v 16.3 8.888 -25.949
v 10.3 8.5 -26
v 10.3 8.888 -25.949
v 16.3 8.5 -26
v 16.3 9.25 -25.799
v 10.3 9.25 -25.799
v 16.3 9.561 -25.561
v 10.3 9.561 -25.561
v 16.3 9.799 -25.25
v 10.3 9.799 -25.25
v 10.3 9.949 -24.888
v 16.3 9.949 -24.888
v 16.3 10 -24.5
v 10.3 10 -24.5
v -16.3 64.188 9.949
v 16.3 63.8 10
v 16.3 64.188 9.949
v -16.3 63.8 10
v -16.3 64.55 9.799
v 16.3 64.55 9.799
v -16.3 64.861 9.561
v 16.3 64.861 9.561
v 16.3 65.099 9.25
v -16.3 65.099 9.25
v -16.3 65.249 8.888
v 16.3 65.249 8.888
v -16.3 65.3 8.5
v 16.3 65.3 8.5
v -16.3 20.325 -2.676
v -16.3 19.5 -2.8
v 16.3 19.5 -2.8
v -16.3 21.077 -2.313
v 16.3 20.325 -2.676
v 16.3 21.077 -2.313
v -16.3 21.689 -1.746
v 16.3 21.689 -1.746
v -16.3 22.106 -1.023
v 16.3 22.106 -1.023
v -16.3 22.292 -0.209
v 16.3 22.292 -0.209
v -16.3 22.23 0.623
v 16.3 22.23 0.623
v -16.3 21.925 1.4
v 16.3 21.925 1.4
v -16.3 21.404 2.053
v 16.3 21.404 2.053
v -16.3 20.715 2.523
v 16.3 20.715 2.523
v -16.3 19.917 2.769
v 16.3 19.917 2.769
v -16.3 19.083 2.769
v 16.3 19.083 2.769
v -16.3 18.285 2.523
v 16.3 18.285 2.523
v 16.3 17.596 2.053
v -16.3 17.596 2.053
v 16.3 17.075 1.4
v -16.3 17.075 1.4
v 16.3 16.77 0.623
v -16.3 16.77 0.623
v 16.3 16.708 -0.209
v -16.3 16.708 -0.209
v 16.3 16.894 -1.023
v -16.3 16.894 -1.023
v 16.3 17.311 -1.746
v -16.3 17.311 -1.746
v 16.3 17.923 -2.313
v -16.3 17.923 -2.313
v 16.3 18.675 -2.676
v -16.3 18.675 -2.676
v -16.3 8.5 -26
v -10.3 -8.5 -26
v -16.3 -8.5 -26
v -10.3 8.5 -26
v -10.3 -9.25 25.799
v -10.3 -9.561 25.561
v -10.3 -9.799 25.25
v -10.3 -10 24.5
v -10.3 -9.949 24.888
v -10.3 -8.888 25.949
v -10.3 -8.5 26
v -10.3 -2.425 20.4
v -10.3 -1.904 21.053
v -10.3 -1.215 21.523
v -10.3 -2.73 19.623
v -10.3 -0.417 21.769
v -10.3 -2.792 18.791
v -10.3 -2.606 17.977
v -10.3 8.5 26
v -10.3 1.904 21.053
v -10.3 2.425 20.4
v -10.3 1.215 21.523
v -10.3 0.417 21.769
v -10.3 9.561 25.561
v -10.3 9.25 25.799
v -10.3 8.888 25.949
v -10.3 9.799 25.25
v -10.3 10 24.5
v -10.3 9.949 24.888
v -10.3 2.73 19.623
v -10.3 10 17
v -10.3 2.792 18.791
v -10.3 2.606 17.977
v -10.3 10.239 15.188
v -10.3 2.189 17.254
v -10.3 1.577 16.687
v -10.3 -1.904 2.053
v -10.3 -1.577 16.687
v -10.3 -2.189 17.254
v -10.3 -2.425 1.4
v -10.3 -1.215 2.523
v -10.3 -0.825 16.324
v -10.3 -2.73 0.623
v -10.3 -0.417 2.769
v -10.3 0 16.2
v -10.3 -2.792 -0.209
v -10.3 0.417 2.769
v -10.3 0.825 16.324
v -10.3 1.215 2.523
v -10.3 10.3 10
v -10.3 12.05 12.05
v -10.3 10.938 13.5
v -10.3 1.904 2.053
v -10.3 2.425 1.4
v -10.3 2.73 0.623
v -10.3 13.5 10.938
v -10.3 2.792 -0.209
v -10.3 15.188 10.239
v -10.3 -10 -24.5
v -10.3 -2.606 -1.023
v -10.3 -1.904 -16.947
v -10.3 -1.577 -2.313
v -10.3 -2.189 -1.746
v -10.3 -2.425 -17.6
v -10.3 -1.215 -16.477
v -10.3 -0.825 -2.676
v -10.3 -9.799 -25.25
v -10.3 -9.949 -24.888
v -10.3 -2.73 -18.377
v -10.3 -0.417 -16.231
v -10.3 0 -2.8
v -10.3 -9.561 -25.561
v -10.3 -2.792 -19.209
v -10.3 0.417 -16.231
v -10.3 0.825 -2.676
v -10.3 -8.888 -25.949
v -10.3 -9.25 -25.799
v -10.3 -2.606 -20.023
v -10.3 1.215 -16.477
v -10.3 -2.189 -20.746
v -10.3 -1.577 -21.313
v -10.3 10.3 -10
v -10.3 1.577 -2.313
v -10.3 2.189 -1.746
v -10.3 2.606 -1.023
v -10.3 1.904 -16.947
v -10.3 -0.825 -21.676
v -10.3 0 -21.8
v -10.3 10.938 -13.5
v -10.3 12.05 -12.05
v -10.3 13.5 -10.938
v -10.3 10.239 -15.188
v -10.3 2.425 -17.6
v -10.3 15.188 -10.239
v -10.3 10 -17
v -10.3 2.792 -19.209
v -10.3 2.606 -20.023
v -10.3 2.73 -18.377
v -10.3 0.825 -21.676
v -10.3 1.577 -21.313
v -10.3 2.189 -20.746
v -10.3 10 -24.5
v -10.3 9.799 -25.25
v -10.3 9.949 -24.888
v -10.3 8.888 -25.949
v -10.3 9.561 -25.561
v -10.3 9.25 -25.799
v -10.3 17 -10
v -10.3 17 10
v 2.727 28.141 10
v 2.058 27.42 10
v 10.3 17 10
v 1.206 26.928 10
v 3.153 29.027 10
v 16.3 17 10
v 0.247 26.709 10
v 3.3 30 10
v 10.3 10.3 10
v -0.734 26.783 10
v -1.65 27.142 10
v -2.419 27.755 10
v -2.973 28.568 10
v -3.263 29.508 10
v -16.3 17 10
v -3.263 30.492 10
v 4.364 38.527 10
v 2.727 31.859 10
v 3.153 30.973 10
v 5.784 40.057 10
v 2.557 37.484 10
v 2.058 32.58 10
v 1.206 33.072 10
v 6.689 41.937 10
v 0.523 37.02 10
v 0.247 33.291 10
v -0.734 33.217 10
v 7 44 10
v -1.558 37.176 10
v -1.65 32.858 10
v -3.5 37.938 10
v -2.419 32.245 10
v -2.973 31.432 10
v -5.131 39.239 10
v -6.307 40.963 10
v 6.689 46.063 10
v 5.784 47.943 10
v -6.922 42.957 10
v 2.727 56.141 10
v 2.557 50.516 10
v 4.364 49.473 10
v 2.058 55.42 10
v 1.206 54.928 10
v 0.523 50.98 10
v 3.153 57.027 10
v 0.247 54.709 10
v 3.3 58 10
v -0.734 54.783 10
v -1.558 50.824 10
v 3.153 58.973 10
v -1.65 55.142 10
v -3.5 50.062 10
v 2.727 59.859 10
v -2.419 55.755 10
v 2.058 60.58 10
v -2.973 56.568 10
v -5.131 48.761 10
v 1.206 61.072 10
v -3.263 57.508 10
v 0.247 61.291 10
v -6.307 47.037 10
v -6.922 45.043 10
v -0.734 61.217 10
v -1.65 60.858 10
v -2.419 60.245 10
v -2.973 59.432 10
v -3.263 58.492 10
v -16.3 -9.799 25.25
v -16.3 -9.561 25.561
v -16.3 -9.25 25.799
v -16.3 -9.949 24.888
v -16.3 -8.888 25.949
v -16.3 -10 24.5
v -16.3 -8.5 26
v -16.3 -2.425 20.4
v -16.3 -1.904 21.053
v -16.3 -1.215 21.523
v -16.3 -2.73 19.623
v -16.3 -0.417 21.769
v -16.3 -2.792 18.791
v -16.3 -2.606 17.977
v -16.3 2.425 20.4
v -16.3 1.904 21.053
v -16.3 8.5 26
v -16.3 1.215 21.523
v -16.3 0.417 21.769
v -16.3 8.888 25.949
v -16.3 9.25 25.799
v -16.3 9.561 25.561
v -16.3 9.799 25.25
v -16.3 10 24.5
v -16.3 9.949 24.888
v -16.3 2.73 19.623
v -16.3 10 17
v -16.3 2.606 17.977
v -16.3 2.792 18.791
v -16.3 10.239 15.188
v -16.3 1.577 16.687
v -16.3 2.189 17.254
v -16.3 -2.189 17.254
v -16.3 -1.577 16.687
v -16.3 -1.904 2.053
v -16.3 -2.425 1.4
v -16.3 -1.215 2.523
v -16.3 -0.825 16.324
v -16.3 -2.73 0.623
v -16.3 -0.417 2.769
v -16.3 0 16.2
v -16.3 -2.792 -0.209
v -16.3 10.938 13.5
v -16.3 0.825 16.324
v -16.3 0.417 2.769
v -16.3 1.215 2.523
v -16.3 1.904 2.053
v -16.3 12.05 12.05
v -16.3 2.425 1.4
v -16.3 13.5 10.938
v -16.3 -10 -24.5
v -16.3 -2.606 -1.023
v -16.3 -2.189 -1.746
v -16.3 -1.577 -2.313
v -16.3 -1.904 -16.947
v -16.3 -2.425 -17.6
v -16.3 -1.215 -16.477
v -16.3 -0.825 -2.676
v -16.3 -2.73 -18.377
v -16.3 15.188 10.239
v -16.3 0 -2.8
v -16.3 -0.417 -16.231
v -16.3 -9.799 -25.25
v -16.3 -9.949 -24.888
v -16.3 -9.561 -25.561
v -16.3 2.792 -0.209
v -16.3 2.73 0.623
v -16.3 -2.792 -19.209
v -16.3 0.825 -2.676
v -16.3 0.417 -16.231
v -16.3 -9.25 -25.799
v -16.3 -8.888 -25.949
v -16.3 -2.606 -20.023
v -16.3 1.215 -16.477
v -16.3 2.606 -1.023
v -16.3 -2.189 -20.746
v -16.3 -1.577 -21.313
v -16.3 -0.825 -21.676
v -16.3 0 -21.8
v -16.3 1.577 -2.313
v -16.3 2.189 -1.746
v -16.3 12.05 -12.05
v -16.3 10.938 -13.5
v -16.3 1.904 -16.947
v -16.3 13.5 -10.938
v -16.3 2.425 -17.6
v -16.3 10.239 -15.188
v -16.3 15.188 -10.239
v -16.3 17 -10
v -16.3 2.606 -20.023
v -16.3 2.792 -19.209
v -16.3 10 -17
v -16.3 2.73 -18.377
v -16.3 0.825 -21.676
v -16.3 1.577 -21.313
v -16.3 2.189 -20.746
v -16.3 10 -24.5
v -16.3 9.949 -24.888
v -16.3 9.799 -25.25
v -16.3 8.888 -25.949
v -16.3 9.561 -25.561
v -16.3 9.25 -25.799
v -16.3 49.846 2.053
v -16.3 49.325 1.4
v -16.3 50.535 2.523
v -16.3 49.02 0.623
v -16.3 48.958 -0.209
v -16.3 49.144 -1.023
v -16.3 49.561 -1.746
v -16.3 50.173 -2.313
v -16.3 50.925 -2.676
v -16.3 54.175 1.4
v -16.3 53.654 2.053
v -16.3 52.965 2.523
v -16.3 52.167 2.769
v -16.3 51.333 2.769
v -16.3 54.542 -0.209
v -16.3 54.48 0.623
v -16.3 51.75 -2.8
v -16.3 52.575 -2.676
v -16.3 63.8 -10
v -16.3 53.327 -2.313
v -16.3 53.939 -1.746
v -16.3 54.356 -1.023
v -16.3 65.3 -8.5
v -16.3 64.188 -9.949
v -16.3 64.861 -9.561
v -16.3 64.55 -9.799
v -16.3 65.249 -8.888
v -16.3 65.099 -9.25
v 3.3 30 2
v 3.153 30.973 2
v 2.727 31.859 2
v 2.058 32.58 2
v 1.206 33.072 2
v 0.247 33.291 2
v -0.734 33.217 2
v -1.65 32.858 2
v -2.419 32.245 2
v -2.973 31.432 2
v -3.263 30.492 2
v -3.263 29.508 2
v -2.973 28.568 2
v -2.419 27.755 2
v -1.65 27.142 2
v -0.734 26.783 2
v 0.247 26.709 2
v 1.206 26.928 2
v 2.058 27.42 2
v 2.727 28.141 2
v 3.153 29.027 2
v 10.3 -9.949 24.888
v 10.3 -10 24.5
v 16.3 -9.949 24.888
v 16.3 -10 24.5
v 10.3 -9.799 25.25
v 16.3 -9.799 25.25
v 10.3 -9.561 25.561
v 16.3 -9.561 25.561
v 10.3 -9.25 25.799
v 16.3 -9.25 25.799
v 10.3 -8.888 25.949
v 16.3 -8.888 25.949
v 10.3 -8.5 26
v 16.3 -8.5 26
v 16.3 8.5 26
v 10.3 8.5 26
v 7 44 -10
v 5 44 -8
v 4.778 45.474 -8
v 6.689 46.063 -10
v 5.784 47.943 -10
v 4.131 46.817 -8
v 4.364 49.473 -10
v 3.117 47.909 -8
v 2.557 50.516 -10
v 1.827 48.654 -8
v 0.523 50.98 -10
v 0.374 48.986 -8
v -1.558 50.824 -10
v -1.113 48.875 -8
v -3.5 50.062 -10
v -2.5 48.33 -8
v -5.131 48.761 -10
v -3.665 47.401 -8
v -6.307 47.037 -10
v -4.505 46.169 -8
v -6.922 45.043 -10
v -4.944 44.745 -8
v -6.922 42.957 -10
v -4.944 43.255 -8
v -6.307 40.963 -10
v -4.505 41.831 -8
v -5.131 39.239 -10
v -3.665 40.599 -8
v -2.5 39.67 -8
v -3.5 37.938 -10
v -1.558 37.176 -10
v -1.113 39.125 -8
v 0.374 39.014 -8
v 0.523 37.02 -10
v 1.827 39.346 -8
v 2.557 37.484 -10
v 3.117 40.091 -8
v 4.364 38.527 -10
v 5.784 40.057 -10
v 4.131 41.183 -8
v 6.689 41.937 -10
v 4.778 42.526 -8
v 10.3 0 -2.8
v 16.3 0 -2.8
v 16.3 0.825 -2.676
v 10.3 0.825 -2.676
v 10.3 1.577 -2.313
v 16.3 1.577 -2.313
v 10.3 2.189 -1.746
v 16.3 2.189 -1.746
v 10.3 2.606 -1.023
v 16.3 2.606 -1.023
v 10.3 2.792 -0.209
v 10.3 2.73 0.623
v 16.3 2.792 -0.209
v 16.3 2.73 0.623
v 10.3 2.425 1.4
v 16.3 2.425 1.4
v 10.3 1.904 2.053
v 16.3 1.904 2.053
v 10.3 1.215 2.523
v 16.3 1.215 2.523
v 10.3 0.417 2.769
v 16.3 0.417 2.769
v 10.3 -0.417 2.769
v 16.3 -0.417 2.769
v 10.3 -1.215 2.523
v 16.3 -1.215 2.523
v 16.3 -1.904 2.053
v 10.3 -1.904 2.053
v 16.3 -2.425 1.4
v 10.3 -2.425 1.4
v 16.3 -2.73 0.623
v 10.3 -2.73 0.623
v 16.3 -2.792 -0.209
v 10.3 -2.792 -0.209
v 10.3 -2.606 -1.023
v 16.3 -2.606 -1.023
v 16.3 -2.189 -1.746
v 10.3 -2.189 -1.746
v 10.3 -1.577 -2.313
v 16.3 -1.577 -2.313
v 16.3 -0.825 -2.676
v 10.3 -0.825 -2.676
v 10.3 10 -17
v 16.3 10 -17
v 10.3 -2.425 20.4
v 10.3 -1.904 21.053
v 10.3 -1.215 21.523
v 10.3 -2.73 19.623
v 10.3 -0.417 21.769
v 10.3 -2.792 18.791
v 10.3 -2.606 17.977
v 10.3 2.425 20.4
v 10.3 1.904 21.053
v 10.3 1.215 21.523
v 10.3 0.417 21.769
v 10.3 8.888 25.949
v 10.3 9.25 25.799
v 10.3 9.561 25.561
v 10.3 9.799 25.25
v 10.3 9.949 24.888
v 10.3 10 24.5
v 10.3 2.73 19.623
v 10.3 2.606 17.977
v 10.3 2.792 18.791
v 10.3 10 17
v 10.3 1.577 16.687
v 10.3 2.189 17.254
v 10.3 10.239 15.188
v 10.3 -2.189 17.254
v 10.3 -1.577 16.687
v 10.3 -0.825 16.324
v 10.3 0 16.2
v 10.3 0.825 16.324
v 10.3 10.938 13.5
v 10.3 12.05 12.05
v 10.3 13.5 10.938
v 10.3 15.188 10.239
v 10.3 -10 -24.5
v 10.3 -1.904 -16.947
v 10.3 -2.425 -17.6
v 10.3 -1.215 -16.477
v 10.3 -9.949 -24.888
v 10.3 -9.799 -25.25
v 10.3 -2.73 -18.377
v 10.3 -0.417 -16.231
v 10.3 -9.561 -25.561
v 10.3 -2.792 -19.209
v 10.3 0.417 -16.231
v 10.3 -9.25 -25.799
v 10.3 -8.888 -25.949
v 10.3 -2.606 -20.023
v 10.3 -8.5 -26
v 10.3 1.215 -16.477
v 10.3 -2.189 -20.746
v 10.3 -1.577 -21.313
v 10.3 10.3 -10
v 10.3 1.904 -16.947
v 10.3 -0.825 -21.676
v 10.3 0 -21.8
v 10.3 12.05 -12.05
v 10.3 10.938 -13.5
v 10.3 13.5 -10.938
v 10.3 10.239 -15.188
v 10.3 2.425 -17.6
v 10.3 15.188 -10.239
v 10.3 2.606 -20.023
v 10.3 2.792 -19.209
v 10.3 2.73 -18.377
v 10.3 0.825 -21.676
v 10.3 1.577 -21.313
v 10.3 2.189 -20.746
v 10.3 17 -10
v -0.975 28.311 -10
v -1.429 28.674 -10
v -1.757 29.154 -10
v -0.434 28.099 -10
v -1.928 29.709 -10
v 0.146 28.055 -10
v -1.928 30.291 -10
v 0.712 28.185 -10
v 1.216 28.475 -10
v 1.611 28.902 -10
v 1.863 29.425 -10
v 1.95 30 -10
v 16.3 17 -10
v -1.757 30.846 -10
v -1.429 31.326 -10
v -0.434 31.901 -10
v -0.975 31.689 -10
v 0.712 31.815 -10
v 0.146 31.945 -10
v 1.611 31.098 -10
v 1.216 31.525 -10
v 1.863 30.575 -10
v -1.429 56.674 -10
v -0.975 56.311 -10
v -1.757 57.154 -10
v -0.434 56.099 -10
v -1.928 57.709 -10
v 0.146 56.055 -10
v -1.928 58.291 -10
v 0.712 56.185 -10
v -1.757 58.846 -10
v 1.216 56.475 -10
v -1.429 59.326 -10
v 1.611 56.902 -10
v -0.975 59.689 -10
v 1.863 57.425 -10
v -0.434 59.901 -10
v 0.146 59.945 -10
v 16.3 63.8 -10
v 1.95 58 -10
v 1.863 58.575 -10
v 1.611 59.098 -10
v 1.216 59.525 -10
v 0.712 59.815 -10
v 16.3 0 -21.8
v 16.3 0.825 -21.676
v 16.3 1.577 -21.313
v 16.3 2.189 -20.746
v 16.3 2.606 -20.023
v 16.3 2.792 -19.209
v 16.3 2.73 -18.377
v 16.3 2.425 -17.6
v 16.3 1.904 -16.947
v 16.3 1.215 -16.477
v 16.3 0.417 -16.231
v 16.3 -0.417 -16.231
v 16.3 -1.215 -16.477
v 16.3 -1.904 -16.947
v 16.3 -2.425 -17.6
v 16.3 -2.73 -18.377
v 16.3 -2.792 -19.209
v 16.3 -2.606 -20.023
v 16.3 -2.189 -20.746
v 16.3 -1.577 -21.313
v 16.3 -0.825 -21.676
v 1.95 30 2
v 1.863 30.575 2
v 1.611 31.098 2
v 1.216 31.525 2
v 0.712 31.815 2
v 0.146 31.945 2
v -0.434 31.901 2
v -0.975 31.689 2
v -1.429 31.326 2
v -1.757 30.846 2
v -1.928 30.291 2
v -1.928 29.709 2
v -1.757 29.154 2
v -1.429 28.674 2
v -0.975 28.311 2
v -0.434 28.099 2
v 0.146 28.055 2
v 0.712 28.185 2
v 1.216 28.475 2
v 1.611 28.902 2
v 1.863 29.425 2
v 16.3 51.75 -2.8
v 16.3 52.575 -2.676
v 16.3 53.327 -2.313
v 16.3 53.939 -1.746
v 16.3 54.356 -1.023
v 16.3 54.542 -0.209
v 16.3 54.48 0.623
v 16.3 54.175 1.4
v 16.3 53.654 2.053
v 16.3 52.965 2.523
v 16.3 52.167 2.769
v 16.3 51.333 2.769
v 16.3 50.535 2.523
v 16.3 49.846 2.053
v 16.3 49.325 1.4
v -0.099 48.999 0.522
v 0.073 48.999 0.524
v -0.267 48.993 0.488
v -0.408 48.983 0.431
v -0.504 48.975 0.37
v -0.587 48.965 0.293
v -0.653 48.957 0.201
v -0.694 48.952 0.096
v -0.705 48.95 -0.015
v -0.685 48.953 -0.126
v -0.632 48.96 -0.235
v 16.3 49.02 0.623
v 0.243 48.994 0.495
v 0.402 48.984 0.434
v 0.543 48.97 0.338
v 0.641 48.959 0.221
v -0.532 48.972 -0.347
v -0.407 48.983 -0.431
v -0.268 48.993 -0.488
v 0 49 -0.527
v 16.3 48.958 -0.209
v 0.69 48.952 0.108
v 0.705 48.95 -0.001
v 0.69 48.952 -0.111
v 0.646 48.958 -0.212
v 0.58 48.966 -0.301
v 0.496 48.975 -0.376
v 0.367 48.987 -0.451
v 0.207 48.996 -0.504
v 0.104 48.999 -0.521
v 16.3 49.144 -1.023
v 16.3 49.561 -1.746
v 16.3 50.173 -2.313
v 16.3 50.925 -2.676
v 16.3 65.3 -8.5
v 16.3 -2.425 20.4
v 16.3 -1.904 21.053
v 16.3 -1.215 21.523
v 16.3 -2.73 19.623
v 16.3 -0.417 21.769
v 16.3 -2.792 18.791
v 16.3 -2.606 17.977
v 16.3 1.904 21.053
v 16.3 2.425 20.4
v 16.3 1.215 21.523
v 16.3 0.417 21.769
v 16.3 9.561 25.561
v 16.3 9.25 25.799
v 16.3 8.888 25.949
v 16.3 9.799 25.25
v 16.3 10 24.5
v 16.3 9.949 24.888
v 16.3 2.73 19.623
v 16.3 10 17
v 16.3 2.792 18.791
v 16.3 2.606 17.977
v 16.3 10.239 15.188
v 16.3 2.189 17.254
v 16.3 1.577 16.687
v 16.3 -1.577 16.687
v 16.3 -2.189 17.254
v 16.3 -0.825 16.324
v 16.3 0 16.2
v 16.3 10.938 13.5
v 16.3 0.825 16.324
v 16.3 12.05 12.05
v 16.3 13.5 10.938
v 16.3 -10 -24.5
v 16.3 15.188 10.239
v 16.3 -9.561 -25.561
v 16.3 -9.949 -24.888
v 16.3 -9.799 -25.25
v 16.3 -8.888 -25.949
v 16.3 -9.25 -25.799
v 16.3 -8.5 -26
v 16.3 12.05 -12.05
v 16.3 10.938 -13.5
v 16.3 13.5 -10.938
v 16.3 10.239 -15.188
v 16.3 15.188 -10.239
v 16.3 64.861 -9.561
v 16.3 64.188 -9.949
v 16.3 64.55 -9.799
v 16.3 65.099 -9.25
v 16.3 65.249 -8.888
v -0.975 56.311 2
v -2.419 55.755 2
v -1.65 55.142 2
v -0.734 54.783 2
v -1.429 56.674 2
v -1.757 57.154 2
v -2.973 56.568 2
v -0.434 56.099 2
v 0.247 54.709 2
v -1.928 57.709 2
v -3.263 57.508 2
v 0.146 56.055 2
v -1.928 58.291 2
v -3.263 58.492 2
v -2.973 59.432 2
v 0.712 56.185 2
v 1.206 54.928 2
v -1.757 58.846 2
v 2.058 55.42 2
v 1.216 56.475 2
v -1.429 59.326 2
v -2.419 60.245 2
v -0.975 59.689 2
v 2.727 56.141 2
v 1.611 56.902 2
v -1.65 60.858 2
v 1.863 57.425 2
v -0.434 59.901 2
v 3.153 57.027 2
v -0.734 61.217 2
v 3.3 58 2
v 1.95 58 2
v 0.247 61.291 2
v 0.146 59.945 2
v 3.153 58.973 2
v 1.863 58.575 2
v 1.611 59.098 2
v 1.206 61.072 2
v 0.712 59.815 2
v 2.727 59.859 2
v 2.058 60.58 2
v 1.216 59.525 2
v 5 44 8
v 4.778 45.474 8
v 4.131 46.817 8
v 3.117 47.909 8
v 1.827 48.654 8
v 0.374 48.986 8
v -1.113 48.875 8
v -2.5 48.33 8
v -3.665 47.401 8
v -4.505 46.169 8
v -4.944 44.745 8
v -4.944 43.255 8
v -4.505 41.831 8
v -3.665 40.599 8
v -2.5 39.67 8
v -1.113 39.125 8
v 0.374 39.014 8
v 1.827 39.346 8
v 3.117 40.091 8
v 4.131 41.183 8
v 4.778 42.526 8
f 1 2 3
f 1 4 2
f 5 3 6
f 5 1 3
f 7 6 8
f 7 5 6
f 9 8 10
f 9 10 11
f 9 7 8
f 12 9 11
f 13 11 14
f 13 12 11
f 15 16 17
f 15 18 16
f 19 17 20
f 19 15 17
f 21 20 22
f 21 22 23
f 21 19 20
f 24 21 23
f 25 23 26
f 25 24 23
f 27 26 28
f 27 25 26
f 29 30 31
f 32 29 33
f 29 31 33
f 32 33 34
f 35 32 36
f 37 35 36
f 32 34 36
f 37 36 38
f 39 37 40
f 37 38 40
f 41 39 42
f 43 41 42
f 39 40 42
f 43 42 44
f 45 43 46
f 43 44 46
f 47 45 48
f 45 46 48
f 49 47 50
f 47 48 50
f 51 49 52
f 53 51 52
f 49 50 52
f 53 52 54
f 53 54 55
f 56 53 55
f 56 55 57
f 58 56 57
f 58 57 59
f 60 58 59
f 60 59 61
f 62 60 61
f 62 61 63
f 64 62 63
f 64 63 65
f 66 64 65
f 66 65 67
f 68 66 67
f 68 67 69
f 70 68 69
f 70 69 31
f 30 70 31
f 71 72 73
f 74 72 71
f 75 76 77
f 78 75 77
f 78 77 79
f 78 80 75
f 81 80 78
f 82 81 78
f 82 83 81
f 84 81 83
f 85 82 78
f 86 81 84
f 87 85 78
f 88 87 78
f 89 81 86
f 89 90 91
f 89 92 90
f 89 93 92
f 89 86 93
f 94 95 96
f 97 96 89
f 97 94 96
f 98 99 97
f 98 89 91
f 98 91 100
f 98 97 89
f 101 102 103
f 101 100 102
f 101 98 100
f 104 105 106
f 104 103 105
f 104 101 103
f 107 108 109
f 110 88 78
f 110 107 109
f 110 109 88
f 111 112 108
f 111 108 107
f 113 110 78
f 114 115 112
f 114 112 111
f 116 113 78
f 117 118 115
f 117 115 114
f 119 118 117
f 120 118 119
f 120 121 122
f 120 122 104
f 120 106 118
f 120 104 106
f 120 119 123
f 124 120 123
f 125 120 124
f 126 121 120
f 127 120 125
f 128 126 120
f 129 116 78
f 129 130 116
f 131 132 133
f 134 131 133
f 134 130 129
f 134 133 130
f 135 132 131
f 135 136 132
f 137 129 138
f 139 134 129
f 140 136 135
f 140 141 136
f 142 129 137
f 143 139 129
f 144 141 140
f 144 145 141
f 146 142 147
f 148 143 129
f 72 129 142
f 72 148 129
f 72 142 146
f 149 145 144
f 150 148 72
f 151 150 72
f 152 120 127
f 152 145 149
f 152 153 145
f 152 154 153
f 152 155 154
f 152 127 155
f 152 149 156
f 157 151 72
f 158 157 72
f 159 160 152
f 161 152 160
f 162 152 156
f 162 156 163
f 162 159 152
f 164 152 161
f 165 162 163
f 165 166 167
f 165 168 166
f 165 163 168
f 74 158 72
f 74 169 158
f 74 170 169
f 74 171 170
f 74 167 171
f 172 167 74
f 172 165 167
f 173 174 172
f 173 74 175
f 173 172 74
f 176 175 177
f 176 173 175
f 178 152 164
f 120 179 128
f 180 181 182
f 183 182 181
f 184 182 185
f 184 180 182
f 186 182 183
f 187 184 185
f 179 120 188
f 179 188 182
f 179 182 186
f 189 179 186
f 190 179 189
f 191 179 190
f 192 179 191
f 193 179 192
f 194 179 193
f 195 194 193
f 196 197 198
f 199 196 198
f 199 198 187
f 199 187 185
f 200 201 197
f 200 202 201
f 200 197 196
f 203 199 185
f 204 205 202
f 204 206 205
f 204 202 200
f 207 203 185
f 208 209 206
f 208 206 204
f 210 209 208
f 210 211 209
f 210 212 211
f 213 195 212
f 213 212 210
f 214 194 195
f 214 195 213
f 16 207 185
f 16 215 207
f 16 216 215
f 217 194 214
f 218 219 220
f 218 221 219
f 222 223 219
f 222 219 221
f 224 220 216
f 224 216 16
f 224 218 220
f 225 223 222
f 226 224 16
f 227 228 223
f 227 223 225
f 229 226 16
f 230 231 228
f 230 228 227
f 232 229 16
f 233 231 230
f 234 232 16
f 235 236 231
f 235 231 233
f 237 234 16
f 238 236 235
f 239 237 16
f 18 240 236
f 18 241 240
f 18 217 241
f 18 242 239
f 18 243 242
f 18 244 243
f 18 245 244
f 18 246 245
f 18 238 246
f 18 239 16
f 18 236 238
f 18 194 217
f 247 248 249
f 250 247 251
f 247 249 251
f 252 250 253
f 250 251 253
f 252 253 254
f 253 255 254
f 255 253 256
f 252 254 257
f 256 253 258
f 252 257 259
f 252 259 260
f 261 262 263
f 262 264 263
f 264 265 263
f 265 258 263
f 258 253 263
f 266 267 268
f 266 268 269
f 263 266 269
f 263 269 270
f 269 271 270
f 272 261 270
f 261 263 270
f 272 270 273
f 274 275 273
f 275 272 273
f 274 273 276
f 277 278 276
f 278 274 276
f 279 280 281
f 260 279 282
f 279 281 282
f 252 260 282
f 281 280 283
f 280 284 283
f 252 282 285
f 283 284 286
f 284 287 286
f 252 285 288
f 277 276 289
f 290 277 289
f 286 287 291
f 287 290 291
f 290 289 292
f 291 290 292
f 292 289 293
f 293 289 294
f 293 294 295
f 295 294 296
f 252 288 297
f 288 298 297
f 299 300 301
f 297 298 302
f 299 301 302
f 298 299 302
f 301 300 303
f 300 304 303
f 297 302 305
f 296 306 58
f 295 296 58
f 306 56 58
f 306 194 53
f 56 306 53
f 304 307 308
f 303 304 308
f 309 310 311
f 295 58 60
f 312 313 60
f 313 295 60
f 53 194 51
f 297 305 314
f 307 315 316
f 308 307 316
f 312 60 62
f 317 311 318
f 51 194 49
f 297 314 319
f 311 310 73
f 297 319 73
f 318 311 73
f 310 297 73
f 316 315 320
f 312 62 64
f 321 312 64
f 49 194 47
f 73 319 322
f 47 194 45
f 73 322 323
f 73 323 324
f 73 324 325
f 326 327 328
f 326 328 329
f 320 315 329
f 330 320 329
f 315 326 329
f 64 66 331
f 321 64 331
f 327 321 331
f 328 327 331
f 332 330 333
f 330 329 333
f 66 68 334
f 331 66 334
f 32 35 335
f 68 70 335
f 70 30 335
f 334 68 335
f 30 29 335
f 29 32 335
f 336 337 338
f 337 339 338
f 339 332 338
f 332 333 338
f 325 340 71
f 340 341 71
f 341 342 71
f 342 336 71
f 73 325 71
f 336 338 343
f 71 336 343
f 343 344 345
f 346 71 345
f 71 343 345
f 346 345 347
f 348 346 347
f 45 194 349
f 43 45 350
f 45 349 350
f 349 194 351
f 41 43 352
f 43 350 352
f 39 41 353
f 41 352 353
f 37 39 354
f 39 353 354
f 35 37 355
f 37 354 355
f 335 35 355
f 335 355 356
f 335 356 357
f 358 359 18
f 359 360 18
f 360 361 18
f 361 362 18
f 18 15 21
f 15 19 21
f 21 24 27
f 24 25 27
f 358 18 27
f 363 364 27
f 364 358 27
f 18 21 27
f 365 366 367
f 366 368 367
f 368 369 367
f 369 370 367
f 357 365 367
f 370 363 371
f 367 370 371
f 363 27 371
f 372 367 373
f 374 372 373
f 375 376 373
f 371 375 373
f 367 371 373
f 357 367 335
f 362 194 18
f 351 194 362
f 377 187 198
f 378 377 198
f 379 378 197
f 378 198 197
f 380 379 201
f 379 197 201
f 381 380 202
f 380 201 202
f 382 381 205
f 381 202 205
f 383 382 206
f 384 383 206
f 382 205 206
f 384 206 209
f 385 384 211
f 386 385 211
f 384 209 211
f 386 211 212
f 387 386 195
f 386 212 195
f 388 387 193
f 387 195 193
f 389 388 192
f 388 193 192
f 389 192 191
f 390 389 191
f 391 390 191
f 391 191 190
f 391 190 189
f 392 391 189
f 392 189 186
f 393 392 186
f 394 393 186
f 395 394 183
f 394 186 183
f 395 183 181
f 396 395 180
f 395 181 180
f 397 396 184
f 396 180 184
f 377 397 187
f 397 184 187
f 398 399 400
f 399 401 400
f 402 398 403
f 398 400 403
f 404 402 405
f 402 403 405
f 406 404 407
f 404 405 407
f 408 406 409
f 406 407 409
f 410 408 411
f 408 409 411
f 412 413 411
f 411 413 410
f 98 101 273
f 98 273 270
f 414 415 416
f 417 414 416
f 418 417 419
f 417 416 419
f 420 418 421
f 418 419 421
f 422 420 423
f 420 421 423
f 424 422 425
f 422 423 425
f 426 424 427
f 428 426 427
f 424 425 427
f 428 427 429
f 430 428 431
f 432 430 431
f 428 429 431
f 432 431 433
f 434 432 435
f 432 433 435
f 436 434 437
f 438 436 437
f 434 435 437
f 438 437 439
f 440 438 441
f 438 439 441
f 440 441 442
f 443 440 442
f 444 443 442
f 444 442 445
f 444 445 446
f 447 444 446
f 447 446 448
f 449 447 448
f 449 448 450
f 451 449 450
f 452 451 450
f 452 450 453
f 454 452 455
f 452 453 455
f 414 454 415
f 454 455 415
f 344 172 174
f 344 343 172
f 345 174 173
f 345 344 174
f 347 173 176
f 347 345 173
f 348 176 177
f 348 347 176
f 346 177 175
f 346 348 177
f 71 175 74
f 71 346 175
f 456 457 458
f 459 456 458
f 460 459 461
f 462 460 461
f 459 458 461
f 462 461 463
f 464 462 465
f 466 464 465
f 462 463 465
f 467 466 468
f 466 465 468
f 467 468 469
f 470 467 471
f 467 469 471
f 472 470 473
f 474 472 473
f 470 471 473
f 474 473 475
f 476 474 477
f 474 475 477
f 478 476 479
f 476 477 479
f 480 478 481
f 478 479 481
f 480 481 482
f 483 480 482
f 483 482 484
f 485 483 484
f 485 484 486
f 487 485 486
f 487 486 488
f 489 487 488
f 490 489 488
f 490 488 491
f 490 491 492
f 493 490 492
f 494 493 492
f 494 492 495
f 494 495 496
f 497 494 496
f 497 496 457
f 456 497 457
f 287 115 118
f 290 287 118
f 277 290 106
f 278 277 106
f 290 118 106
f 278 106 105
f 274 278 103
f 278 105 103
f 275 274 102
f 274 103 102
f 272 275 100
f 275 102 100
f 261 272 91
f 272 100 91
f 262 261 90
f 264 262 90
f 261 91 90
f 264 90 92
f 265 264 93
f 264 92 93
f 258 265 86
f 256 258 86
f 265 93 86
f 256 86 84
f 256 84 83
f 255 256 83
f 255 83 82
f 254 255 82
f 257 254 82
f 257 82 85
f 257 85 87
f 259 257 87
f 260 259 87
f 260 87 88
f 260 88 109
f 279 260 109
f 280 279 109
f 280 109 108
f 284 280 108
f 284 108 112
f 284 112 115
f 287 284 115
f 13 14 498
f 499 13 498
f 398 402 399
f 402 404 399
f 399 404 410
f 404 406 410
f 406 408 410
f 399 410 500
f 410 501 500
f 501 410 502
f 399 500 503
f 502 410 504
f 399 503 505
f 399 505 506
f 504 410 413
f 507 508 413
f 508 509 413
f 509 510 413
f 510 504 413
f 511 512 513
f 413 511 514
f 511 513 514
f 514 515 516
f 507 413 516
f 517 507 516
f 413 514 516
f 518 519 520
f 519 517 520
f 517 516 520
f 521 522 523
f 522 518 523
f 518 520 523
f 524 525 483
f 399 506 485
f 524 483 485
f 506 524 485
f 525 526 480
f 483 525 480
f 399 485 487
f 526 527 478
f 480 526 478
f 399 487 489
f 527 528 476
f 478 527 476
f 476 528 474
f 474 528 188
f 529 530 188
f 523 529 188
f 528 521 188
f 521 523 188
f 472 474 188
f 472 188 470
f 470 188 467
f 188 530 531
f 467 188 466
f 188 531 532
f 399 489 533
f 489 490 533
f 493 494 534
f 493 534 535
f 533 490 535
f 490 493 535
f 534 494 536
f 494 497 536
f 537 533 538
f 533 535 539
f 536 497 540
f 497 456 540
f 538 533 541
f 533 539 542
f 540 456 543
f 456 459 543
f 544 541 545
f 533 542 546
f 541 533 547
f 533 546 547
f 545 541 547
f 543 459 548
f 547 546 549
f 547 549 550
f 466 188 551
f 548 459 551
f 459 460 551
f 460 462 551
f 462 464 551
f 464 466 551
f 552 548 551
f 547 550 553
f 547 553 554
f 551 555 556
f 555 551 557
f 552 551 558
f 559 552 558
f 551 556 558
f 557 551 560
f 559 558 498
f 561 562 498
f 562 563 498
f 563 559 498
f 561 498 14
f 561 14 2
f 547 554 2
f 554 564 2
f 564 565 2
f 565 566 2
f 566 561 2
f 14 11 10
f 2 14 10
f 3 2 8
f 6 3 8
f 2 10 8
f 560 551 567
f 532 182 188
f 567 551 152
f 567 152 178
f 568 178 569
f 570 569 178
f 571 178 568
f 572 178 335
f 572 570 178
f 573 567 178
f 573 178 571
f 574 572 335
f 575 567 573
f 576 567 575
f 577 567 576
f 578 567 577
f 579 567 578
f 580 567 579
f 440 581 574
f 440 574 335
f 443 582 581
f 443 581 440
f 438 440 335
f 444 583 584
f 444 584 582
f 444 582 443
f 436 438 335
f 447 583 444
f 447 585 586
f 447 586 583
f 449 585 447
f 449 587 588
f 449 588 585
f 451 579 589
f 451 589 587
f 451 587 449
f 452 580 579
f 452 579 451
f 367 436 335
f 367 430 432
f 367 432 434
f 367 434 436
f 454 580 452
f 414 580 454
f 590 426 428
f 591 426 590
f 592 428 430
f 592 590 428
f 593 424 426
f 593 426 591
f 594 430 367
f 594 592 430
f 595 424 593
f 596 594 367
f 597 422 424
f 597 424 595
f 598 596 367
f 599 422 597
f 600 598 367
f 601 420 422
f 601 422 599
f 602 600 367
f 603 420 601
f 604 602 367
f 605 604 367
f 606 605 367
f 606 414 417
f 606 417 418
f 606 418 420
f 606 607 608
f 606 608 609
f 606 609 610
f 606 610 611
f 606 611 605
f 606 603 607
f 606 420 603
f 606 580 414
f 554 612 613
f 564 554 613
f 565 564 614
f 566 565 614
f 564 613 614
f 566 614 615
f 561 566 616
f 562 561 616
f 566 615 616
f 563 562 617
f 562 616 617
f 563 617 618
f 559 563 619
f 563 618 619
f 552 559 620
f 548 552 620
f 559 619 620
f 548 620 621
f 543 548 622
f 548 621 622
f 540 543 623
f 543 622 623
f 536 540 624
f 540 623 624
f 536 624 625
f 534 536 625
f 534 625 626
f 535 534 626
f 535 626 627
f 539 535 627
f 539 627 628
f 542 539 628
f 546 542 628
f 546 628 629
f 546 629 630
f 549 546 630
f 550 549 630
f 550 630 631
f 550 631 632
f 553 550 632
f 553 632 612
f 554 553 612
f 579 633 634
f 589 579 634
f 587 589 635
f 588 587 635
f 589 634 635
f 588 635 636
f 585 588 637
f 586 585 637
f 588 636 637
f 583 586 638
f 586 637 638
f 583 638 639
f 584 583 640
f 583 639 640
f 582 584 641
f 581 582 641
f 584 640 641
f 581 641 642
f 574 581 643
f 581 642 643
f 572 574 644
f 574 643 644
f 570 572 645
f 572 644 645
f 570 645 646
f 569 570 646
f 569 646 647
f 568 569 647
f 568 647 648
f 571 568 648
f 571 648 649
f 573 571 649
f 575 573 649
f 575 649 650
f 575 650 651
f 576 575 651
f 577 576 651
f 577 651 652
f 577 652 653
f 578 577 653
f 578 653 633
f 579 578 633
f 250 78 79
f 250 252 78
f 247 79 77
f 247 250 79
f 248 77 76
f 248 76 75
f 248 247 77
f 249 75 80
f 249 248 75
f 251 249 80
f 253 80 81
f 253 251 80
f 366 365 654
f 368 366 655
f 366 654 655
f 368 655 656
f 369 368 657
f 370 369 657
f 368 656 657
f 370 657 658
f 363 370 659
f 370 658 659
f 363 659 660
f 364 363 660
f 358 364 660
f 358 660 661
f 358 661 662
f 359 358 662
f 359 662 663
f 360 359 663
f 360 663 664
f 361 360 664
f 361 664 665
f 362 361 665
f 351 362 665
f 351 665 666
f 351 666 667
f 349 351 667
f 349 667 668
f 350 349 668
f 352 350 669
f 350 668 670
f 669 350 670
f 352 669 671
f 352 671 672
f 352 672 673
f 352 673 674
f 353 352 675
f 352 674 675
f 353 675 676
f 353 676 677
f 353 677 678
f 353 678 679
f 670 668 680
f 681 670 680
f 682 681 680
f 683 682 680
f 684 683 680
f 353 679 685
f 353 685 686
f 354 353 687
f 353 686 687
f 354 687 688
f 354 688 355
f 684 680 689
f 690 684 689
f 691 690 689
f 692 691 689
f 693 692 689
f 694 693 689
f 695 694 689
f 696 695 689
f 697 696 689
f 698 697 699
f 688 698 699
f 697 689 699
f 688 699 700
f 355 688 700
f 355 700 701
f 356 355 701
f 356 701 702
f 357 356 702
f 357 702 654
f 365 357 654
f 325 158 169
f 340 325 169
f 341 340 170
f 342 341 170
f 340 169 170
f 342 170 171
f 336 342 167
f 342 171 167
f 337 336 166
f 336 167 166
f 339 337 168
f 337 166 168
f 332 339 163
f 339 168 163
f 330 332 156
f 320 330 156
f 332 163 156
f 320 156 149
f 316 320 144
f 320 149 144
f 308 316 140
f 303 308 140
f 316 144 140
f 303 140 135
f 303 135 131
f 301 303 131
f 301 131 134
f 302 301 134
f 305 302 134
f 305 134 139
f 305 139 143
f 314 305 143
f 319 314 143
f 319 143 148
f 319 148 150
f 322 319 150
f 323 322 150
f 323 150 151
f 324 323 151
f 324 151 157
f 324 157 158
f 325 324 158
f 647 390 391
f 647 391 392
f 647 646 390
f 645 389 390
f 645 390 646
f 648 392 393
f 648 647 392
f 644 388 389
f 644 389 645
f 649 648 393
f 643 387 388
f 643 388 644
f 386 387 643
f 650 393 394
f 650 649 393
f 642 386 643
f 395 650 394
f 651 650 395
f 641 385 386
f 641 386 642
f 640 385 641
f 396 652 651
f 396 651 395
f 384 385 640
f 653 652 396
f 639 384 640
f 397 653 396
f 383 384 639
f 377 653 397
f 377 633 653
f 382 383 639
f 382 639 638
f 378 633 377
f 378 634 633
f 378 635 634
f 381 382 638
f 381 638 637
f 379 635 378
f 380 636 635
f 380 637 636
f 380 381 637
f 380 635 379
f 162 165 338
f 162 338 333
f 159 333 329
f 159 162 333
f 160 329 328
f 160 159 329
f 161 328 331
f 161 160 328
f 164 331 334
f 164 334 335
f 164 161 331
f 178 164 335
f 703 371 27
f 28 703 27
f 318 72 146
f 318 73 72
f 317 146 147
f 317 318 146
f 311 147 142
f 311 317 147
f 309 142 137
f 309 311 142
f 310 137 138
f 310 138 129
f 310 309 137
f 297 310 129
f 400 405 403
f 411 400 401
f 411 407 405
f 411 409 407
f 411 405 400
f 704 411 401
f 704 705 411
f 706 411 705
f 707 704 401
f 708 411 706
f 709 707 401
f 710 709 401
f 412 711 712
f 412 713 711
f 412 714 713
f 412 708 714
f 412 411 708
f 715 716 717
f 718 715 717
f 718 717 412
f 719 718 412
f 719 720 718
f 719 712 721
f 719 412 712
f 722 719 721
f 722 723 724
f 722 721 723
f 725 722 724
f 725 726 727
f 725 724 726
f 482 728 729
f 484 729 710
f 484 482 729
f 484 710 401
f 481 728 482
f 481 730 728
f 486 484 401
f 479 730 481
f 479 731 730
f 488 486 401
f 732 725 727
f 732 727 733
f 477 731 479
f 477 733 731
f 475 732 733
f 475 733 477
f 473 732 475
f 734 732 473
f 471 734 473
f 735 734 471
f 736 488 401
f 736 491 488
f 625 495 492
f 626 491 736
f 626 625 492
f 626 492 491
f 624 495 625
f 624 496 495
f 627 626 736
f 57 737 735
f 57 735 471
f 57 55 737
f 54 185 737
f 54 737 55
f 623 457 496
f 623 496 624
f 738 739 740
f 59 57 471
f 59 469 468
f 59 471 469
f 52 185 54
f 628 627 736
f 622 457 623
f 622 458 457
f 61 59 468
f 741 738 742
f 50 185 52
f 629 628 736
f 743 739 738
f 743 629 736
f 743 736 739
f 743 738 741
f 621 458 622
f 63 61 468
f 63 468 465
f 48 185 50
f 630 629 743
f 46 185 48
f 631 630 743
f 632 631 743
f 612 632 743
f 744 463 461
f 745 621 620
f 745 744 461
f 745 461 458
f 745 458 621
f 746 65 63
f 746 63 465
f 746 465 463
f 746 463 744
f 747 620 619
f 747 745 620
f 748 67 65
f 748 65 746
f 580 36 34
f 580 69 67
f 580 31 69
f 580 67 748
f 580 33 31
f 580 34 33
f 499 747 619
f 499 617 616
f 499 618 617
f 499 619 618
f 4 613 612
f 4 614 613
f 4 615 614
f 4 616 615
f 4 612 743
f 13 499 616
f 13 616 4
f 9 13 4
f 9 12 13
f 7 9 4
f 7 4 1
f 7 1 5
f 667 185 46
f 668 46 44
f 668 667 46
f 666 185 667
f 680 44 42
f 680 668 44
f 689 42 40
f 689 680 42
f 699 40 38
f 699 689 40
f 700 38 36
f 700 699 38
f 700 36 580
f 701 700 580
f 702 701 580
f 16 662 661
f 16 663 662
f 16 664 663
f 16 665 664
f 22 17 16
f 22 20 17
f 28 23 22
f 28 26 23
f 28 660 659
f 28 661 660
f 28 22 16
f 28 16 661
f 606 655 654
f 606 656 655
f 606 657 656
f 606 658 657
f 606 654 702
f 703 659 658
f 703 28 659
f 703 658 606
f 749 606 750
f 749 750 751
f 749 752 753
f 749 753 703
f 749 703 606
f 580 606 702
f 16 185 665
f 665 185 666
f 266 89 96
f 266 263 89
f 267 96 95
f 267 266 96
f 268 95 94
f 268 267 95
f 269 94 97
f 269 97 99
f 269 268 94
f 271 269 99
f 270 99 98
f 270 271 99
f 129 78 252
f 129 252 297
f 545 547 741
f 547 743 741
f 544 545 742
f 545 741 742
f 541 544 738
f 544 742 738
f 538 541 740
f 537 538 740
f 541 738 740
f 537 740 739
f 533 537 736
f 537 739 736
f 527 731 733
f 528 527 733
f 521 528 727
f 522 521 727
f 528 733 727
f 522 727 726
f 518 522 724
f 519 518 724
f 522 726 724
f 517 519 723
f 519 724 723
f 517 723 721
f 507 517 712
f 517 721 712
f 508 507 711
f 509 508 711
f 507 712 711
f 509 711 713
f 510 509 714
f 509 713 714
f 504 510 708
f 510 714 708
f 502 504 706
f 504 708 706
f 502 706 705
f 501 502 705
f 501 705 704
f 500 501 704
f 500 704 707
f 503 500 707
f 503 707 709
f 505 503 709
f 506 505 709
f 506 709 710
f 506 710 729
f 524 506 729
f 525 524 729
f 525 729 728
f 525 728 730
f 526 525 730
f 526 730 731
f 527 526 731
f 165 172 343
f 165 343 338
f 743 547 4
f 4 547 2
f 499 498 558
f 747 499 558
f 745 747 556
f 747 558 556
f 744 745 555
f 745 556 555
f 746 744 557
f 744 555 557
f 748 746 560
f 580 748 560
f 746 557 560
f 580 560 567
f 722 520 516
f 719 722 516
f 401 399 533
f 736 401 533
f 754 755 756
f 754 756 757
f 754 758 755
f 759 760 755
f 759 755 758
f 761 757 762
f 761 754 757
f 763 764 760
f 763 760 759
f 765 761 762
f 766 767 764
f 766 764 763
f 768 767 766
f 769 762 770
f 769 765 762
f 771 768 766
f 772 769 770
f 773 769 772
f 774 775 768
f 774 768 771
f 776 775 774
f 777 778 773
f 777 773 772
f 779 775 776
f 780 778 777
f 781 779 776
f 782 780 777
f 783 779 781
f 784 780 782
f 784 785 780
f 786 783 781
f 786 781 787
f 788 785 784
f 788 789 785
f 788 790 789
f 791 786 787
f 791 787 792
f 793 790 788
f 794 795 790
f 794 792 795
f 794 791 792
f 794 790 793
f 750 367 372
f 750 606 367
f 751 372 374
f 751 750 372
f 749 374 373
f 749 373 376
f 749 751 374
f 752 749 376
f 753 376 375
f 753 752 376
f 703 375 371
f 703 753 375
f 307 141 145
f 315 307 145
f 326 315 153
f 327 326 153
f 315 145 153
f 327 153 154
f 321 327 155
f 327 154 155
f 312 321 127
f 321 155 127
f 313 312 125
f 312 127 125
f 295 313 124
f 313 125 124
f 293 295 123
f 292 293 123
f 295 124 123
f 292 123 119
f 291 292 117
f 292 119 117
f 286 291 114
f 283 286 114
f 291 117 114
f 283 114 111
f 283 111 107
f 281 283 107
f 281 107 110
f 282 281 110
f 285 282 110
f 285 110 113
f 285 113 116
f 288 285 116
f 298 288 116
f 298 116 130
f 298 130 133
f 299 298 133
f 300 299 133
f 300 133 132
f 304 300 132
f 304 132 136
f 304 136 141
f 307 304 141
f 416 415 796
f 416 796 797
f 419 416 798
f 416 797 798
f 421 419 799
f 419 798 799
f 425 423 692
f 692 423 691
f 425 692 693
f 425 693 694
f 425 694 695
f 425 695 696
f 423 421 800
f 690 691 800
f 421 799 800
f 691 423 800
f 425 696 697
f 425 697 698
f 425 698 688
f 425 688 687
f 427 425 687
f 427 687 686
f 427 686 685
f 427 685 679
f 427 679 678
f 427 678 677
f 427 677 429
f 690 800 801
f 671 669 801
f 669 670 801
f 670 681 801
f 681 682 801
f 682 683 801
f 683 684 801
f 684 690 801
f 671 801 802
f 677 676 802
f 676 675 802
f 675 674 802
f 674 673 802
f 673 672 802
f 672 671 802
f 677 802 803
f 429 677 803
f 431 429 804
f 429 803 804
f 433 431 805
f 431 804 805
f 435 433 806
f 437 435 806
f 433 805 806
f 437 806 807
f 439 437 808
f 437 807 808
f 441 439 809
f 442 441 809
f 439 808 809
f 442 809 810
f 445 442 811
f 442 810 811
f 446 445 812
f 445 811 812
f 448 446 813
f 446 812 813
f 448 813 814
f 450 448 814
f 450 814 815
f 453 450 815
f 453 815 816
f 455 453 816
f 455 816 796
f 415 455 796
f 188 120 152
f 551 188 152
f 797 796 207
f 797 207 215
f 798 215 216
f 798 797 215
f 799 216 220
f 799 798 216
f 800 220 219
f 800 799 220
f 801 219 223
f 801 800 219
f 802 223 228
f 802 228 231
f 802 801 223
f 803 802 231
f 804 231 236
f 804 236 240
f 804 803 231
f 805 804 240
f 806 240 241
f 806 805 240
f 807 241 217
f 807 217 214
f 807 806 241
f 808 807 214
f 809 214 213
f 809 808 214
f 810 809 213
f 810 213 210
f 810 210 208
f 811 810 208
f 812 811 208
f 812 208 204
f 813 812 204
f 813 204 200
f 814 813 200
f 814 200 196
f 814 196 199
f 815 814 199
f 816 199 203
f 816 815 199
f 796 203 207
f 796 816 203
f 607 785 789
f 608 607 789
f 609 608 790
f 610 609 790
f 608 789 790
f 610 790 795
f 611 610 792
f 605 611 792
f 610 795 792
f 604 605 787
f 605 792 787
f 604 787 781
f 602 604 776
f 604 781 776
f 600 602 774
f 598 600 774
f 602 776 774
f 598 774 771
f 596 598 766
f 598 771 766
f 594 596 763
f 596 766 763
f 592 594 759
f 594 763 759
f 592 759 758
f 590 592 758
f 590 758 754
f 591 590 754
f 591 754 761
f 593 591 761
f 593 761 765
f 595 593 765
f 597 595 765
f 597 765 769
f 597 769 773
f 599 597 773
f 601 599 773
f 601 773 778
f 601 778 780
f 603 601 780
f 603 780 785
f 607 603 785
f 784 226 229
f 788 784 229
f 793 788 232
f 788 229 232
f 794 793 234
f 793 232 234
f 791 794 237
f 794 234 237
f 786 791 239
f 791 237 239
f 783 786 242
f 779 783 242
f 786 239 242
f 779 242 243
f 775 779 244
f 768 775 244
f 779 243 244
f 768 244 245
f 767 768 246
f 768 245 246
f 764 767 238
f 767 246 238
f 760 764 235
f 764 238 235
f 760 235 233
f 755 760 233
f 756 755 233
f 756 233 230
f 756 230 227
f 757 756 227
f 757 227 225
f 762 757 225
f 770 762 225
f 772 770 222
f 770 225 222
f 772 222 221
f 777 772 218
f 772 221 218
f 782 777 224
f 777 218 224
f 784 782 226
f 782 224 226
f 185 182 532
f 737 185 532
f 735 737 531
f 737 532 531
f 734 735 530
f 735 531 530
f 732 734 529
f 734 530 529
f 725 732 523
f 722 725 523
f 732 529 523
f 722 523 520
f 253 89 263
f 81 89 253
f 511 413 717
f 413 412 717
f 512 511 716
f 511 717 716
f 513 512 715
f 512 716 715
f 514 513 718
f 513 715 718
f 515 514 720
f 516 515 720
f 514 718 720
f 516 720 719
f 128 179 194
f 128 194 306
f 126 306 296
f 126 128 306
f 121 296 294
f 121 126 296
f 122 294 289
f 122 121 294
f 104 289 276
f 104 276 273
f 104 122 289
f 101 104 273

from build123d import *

# Parameters (mm, degrees)
EXTRUDE1_DEPTH      = 10.3
EXTRUDE1_DEPTH_BACK = 10.3
SKETCH1_W           = 20
SKETCH1_H           = 55
EXTRUDE2_DEPTH      = 6
SKETCH4_R           = 2.8
EXTRUDE3_DEPTH      = 78.478061411
SKETCH5_R           = 5
EXTRUDE4_DEPTH      = 77.326797391
FILLET2_R           = 1.5
CHAMFER1_SIZE       = 2
SKETCH7_R           = 1.95
EXTRUDE5_DEPTH      = 77.326797413
SKETCH8_R           = 3.3
EXTRUDE6_DEPTH      = 8


with BuildPart() as part:
    # Sketch1 → Extrude1 (new, two sides: drawn at the far end of the back side and taken through both)
    with BuildSketch(Plane(origin=(0, 0, 0), x_dir=(0, 0, -1), z_dir=(1, 0, 0)).offset(-EXTRUDE1_DEPTH_BACK)):
        with Locations((0, 37.8)):
            Rectangle(SKETCH1_W, SKETCH1_H)
    extrude(amount=EXTRUDE1_DEPTH + EXTRUDE1_DEPTH_BACK)

    # Sketch2 → Extrude2 (add)
    with BuildSketch(Plane(origin=(10.3, 0, 0), x_dir=(0, 0, -1), z_dir=(1, 0, 0))):
        with BuildLine():
            Line((26, 10), (17, 10))
            ThreePointArc((17, 10), (12.050252532, 12.050252532), (10, 17))
            Line((10, 17), (10, 65.3))
            Line((10, 65.3), (-10, 65.3))
            Line((-10, 65.3), (-10, 17))
            ThreePointArc((-10, 17), (-12.050252532, 12.050252532), (-17, 10))
            Line((-17, 10), (-26, 10))
            Line((-26, 10), (-26, -10))
            Line((-26, -10), (26, -10))
            Line((26, -10), (26, 10))
        make_face()
    extrude2 = extrude(amount=EXTRUDE2_DEPTH)

    # Mirror2: Extrude2 across plane
    add(extrude2.mirror(Plane(origin=(0, 0, 0), x_dir=(0, 0, 1), z_dir=(1, 0, 0))))

    # Sketch4 → Extrude3 (cut, through all)
    with BuildSketch(Plane(origin=(16.3, 0, 0), x_dir=(0, 0, -1), z_dir=(1, 0, 0))):
        Circle(SKETCH4_R)
        with Locations((19, 0)):
            Circle(SKETCH4_R)
        with Locations((-19, 0)):
            Circle(SKETCH4_R)
        with Locations((0, 19.5)):
            Circle(SKETCH4_R)
        with Locations((0, 51.75)):
            Circle(SKETCH4_R)
    extrude(amount=-EXTRUDE3_DEPTH, mode=Mode.SUBTRACT)

    # Sketch5 → Extrude4 (cut, through all)
    with BuildSketch(Plane.XY.offset(10)):
        with Locations((0, 44)):
            Circle(SKETCH5_R)
    extrude(amount=-EXTRUDE4_DEPTH, mode=Mode.SUBTRACT)

    # Fillet2
    fillet2_edges = [part.edges().sort_by_distance(p)[0] for p in [
        (13.3, 10, 26),
        (13.3, -10, 26),
        (13.3, -10, -26),
        (13.3, 10, -26),
        (-13.3, -10, 26),
        (-13.3, 10, 26),
        (-13.3, 10, -26),
        (-13.3, -10, -26),
        (0, 65.3, 10),
        (0, 65.3, -10),
    ]]
    fillet(fillet2_edges, radius=FILLET2_R)

    # Chamfer1
    chamfer1_edges = [part.edges().sort_by_distance(p)[0] for p in [
        (-5, 44, -10),
        (-5, 44, 10),
    ]]
    chamfer(chamfer1_edges, length=CHAMFER1_SIZE)

    # Sketch7 → Extrude5 (cut, through all)
    with BuildSketch(Plane.XY.offset(10)):
        with Locations((0, 58)):
            Circle(SKETCH7_R)
        with Locations((0, 30)):
            Circle(SKETCH7_R)
    extrude(amount=-EXTRUDE5_DEPTH, mode=Mode.SUBTRACT)

    # Sketch8 → Extrude6 (cut)
    with BuildSketch(Plane.XY.offset(10)):
        with Locations((0, 58)):
            Circle(SKETCH8_R)
        with Locations((0, 30)):
            Circle(SKETCH8_R)
    extrude(amount=-EXTRUDE6_DEPTH, mode=Mode.SUBTRACT)


solid = part.part
